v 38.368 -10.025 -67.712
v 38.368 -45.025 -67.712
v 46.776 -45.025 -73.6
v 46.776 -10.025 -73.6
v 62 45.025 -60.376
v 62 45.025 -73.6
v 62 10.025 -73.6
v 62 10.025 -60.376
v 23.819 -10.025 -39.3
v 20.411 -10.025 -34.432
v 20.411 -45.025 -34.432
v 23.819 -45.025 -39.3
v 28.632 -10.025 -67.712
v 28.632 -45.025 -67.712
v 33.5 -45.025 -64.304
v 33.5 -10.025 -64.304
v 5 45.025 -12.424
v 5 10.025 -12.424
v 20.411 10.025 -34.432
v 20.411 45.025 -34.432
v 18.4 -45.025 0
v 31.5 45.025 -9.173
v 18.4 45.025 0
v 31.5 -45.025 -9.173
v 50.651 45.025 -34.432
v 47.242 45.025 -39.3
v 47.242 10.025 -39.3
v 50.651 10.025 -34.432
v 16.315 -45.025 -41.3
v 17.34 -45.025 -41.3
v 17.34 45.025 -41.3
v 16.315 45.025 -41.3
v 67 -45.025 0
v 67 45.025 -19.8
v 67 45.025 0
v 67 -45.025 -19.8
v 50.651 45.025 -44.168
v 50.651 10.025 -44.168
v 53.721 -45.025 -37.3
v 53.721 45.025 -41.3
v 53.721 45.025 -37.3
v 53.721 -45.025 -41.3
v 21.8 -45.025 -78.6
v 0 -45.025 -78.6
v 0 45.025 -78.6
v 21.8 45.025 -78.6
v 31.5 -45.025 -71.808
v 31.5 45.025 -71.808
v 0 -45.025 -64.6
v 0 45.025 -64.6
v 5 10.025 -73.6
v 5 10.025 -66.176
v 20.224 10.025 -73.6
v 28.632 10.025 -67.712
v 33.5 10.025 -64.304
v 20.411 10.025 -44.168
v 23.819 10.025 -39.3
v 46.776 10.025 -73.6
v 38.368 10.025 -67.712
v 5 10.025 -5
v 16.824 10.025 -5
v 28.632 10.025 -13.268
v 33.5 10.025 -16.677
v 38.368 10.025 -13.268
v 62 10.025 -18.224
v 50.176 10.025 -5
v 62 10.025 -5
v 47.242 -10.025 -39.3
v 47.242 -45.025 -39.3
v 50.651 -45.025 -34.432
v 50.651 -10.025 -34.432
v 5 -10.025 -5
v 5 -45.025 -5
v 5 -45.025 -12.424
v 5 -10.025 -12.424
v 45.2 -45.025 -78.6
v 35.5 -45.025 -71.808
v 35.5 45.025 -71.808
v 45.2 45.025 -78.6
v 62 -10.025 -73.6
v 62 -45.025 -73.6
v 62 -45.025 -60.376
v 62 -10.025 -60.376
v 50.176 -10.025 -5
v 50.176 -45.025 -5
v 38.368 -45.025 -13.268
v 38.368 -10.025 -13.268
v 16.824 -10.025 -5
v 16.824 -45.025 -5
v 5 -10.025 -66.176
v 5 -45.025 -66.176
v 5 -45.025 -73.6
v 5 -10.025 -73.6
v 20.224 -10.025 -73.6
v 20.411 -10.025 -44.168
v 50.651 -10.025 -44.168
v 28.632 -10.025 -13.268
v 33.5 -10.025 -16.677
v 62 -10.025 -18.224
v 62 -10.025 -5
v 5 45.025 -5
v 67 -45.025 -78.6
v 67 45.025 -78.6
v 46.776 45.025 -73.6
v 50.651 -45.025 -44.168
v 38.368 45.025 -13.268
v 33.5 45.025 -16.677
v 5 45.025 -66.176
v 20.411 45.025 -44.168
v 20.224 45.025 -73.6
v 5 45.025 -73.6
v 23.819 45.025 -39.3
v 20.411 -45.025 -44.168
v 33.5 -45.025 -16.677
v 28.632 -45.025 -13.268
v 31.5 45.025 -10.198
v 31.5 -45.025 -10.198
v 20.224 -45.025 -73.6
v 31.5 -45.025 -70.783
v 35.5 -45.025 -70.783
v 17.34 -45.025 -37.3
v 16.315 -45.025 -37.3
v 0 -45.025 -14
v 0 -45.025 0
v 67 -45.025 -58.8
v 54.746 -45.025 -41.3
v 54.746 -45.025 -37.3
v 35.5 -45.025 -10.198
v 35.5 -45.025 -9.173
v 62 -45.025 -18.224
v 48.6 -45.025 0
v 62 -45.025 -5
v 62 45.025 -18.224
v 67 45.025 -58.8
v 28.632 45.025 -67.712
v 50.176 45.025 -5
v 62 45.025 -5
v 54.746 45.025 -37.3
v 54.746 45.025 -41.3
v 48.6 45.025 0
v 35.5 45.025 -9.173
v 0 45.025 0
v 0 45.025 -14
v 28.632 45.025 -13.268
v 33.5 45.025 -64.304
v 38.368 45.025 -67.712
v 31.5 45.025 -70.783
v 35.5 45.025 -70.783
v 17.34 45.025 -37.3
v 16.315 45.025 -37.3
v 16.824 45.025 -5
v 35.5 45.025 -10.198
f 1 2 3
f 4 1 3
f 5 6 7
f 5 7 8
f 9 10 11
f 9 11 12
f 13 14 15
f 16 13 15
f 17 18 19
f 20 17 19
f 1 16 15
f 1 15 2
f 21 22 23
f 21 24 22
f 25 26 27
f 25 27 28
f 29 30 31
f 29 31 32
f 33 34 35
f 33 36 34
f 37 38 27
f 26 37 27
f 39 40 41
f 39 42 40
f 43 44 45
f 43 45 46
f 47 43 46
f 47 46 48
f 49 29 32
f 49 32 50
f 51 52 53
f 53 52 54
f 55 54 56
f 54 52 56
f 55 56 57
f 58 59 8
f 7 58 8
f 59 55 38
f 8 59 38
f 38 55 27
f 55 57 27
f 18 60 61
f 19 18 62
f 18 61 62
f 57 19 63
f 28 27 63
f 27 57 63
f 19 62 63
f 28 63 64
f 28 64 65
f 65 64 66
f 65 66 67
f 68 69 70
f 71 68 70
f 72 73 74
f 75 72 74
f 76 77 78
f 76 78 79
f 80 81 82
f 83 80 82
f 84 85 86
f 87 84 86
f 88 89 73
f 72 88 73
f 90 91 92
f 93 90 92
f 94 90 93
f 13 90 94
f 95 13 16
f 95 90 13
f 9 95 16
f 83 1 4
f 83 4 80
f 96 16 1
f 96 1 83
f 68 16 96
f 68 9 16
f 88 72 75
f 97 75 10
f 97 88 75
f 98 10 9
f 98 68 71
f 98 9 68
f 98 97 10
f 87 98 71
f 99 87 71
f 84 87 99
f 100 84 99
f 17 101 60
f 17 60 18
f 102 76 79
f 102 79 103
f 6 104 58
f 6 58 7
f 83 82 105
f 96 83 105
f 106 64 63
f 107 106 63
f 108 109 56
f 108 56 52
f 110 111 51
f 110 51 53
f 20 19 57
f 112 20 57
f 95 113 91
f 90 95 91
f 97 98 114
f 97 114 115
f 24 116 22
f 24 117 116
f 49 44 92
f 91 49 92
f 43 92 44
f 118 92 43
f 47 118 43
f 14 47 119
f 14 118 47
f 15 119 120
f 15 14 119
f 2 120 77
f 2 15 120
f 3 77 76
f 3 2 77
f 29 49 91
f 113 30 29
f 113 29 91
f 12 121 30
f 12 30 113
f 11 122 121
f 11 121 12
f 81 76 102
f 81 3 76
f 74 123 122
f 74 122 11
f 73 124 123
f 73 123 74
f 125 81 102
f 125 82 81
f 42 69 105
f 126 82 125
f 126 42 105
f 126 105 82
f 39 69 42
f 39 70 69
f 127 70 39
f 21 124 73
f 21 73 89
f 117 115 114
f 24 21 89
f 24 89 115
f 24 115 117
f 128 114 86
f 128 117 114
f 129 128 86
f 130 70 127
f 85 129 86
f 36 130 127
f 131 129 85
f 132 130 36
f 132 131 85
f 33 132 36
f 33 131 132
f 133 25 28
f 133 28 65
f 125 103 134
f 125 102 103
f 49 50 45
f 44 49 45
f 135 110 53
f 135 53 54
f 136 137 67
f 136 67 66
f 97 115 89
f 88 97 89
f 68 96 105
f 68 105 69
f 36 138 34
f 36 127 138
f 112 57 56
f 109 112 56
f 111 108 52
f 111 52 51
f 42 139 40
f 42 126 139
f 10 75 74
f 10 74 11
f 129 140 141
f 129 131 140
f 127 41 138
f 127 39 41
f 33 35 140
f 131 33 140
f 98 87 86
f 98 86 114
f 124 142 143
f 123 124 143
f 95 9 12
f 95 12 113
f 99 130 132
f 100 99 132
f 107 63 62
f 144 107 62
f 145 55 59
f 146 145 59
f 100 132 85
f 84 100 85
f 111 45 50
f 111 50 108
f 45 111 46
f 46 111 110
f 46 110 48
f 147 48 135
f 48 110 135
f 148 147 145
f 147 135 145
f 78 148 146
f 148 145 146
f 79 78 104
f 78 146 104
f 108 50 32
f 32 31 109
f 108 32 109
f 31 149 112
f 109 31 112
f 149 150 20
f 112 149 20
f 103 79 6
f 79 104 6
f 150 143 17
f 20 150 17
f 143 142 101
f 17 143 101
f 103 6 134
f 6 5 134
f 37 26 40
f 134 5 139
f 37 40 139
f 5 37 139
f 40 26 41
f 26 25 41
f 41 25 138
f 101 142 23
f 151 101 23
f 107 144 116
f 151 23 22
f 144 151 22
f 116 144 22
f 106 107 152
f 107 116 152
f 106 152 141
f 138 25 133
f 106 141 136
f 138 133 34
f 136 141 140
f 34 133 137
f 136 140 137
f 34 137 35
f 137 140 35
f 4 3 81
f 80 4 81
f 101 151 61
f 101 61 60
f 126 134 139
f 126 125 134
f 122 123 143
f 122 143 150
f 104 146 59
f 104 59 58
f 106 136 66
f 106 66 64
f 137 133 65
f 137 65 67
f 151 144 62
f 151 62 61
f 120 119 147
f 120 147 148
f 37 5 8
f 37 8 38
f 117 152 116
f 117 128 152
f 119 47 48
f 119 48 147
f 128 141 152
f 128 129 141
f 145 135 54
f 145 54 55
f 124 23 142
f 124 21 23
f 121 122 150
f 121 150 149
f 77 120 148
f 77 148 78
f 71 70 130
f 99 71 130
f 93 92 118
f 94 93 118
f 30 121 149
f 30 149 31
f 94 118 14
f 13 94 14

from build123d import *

# Parameters (mm, degrees)
F1_DEPTH = 45.025
F3_DEPTH = 35


with BuildPart() as f1:
    # F0 (on Front) → F1 (new body)
    with BuildSketch(Plane.XZ):
        Polygon((18.4, 0), (0, 0), (0, -14), (16.314836, -37.3), (17.339836, -37.3), (17.339836, -38.763852), (17.715251, -39.3), (17.339836, -39.836148), (17.339836, -41.3), (16.314836, -41.3), (0, -64.6), (0, -78.6), (21.8, -78.6), (31.5, -71.807987), (31.5, -70.782987), (32.963852, -70.782987), (33.5, -70.407572), (34.036148, -70.782987), (35.5, -70.782987), (35.5, -71.807987), (45.2, -78.6), (67, -78.6), (67, -58.8), (54.746368, -41.3), (53.721368, -41.3), (53.721368, -39.836148), (53.345953, -39.3), (53.721368, -38.763852), (53.721368, -37.3), (54.746368, -37.3), (67, -19.8), (67, 0), (48.6, 0), (35.5, -9.172719), (35.5, -10.197719), (34.036148, -10.197719), (33.5, -10.573134), (32.963852, -10.197719), (31.5, -10.197719), (31.5, -9.172719), align=None)
        Polygon((53.721368, -39.836148), (53.721368, -38.763852), (53.345953, -39.3), align=None)
        Polygon((17.715251, -39.3), (17.339836, -38.763852), (17.339836, -39.836148), align=None)
        Polygon((34.036148, -10.197719), (32.963852, -10.197719), (33.5, -10.573134), align=None)
        Polygon((33.5, -70.407572), (32.963852, -70.782987), (34.036148, -70.782987), align=None)
    extrude(amount=F1_DEPTH)

    # F2 (on face) → F3 (cut)
    with BuildSketch(Plane.XZ.offset(45.025)):
        Polygon((28.632118, -13.268479), (16.823506, -5), (5, -5), (5, -12.423506), (20.410596, -34.432118), (23.819123, -39.299999), (20.410595, -44.167881), (4.999998, -66.176493), (4.999998, -73.600002), (20.223507, -73.600002), (28.632119, -67.712228), (33.500001, -64.3037), (38.367882, -67.712227), (46.776494, -73.6), (62, -73.6), (62, -60.376494), (50.650608, -44.167882), (47.24208, -39.3), (50.650608, -34.432118), (62, -18.223506), (62, -5), (50.176494, -5), (38.367882, -13.268479), (33.5, -16.677007), align=None)
    extrude(amount=-F3_DEPTH, mode=Mode.SUBTRACT)

    # F4: F1 across face


with BuildPart() as f1_1:
    add(f1.part)
    add(f1.part.mirror(Plane(origin=(34.584807, 0, -39.813495), x_dir=(1, 0, 0), z_dir=(0, 1, 0))))


solid = f1_1.part
